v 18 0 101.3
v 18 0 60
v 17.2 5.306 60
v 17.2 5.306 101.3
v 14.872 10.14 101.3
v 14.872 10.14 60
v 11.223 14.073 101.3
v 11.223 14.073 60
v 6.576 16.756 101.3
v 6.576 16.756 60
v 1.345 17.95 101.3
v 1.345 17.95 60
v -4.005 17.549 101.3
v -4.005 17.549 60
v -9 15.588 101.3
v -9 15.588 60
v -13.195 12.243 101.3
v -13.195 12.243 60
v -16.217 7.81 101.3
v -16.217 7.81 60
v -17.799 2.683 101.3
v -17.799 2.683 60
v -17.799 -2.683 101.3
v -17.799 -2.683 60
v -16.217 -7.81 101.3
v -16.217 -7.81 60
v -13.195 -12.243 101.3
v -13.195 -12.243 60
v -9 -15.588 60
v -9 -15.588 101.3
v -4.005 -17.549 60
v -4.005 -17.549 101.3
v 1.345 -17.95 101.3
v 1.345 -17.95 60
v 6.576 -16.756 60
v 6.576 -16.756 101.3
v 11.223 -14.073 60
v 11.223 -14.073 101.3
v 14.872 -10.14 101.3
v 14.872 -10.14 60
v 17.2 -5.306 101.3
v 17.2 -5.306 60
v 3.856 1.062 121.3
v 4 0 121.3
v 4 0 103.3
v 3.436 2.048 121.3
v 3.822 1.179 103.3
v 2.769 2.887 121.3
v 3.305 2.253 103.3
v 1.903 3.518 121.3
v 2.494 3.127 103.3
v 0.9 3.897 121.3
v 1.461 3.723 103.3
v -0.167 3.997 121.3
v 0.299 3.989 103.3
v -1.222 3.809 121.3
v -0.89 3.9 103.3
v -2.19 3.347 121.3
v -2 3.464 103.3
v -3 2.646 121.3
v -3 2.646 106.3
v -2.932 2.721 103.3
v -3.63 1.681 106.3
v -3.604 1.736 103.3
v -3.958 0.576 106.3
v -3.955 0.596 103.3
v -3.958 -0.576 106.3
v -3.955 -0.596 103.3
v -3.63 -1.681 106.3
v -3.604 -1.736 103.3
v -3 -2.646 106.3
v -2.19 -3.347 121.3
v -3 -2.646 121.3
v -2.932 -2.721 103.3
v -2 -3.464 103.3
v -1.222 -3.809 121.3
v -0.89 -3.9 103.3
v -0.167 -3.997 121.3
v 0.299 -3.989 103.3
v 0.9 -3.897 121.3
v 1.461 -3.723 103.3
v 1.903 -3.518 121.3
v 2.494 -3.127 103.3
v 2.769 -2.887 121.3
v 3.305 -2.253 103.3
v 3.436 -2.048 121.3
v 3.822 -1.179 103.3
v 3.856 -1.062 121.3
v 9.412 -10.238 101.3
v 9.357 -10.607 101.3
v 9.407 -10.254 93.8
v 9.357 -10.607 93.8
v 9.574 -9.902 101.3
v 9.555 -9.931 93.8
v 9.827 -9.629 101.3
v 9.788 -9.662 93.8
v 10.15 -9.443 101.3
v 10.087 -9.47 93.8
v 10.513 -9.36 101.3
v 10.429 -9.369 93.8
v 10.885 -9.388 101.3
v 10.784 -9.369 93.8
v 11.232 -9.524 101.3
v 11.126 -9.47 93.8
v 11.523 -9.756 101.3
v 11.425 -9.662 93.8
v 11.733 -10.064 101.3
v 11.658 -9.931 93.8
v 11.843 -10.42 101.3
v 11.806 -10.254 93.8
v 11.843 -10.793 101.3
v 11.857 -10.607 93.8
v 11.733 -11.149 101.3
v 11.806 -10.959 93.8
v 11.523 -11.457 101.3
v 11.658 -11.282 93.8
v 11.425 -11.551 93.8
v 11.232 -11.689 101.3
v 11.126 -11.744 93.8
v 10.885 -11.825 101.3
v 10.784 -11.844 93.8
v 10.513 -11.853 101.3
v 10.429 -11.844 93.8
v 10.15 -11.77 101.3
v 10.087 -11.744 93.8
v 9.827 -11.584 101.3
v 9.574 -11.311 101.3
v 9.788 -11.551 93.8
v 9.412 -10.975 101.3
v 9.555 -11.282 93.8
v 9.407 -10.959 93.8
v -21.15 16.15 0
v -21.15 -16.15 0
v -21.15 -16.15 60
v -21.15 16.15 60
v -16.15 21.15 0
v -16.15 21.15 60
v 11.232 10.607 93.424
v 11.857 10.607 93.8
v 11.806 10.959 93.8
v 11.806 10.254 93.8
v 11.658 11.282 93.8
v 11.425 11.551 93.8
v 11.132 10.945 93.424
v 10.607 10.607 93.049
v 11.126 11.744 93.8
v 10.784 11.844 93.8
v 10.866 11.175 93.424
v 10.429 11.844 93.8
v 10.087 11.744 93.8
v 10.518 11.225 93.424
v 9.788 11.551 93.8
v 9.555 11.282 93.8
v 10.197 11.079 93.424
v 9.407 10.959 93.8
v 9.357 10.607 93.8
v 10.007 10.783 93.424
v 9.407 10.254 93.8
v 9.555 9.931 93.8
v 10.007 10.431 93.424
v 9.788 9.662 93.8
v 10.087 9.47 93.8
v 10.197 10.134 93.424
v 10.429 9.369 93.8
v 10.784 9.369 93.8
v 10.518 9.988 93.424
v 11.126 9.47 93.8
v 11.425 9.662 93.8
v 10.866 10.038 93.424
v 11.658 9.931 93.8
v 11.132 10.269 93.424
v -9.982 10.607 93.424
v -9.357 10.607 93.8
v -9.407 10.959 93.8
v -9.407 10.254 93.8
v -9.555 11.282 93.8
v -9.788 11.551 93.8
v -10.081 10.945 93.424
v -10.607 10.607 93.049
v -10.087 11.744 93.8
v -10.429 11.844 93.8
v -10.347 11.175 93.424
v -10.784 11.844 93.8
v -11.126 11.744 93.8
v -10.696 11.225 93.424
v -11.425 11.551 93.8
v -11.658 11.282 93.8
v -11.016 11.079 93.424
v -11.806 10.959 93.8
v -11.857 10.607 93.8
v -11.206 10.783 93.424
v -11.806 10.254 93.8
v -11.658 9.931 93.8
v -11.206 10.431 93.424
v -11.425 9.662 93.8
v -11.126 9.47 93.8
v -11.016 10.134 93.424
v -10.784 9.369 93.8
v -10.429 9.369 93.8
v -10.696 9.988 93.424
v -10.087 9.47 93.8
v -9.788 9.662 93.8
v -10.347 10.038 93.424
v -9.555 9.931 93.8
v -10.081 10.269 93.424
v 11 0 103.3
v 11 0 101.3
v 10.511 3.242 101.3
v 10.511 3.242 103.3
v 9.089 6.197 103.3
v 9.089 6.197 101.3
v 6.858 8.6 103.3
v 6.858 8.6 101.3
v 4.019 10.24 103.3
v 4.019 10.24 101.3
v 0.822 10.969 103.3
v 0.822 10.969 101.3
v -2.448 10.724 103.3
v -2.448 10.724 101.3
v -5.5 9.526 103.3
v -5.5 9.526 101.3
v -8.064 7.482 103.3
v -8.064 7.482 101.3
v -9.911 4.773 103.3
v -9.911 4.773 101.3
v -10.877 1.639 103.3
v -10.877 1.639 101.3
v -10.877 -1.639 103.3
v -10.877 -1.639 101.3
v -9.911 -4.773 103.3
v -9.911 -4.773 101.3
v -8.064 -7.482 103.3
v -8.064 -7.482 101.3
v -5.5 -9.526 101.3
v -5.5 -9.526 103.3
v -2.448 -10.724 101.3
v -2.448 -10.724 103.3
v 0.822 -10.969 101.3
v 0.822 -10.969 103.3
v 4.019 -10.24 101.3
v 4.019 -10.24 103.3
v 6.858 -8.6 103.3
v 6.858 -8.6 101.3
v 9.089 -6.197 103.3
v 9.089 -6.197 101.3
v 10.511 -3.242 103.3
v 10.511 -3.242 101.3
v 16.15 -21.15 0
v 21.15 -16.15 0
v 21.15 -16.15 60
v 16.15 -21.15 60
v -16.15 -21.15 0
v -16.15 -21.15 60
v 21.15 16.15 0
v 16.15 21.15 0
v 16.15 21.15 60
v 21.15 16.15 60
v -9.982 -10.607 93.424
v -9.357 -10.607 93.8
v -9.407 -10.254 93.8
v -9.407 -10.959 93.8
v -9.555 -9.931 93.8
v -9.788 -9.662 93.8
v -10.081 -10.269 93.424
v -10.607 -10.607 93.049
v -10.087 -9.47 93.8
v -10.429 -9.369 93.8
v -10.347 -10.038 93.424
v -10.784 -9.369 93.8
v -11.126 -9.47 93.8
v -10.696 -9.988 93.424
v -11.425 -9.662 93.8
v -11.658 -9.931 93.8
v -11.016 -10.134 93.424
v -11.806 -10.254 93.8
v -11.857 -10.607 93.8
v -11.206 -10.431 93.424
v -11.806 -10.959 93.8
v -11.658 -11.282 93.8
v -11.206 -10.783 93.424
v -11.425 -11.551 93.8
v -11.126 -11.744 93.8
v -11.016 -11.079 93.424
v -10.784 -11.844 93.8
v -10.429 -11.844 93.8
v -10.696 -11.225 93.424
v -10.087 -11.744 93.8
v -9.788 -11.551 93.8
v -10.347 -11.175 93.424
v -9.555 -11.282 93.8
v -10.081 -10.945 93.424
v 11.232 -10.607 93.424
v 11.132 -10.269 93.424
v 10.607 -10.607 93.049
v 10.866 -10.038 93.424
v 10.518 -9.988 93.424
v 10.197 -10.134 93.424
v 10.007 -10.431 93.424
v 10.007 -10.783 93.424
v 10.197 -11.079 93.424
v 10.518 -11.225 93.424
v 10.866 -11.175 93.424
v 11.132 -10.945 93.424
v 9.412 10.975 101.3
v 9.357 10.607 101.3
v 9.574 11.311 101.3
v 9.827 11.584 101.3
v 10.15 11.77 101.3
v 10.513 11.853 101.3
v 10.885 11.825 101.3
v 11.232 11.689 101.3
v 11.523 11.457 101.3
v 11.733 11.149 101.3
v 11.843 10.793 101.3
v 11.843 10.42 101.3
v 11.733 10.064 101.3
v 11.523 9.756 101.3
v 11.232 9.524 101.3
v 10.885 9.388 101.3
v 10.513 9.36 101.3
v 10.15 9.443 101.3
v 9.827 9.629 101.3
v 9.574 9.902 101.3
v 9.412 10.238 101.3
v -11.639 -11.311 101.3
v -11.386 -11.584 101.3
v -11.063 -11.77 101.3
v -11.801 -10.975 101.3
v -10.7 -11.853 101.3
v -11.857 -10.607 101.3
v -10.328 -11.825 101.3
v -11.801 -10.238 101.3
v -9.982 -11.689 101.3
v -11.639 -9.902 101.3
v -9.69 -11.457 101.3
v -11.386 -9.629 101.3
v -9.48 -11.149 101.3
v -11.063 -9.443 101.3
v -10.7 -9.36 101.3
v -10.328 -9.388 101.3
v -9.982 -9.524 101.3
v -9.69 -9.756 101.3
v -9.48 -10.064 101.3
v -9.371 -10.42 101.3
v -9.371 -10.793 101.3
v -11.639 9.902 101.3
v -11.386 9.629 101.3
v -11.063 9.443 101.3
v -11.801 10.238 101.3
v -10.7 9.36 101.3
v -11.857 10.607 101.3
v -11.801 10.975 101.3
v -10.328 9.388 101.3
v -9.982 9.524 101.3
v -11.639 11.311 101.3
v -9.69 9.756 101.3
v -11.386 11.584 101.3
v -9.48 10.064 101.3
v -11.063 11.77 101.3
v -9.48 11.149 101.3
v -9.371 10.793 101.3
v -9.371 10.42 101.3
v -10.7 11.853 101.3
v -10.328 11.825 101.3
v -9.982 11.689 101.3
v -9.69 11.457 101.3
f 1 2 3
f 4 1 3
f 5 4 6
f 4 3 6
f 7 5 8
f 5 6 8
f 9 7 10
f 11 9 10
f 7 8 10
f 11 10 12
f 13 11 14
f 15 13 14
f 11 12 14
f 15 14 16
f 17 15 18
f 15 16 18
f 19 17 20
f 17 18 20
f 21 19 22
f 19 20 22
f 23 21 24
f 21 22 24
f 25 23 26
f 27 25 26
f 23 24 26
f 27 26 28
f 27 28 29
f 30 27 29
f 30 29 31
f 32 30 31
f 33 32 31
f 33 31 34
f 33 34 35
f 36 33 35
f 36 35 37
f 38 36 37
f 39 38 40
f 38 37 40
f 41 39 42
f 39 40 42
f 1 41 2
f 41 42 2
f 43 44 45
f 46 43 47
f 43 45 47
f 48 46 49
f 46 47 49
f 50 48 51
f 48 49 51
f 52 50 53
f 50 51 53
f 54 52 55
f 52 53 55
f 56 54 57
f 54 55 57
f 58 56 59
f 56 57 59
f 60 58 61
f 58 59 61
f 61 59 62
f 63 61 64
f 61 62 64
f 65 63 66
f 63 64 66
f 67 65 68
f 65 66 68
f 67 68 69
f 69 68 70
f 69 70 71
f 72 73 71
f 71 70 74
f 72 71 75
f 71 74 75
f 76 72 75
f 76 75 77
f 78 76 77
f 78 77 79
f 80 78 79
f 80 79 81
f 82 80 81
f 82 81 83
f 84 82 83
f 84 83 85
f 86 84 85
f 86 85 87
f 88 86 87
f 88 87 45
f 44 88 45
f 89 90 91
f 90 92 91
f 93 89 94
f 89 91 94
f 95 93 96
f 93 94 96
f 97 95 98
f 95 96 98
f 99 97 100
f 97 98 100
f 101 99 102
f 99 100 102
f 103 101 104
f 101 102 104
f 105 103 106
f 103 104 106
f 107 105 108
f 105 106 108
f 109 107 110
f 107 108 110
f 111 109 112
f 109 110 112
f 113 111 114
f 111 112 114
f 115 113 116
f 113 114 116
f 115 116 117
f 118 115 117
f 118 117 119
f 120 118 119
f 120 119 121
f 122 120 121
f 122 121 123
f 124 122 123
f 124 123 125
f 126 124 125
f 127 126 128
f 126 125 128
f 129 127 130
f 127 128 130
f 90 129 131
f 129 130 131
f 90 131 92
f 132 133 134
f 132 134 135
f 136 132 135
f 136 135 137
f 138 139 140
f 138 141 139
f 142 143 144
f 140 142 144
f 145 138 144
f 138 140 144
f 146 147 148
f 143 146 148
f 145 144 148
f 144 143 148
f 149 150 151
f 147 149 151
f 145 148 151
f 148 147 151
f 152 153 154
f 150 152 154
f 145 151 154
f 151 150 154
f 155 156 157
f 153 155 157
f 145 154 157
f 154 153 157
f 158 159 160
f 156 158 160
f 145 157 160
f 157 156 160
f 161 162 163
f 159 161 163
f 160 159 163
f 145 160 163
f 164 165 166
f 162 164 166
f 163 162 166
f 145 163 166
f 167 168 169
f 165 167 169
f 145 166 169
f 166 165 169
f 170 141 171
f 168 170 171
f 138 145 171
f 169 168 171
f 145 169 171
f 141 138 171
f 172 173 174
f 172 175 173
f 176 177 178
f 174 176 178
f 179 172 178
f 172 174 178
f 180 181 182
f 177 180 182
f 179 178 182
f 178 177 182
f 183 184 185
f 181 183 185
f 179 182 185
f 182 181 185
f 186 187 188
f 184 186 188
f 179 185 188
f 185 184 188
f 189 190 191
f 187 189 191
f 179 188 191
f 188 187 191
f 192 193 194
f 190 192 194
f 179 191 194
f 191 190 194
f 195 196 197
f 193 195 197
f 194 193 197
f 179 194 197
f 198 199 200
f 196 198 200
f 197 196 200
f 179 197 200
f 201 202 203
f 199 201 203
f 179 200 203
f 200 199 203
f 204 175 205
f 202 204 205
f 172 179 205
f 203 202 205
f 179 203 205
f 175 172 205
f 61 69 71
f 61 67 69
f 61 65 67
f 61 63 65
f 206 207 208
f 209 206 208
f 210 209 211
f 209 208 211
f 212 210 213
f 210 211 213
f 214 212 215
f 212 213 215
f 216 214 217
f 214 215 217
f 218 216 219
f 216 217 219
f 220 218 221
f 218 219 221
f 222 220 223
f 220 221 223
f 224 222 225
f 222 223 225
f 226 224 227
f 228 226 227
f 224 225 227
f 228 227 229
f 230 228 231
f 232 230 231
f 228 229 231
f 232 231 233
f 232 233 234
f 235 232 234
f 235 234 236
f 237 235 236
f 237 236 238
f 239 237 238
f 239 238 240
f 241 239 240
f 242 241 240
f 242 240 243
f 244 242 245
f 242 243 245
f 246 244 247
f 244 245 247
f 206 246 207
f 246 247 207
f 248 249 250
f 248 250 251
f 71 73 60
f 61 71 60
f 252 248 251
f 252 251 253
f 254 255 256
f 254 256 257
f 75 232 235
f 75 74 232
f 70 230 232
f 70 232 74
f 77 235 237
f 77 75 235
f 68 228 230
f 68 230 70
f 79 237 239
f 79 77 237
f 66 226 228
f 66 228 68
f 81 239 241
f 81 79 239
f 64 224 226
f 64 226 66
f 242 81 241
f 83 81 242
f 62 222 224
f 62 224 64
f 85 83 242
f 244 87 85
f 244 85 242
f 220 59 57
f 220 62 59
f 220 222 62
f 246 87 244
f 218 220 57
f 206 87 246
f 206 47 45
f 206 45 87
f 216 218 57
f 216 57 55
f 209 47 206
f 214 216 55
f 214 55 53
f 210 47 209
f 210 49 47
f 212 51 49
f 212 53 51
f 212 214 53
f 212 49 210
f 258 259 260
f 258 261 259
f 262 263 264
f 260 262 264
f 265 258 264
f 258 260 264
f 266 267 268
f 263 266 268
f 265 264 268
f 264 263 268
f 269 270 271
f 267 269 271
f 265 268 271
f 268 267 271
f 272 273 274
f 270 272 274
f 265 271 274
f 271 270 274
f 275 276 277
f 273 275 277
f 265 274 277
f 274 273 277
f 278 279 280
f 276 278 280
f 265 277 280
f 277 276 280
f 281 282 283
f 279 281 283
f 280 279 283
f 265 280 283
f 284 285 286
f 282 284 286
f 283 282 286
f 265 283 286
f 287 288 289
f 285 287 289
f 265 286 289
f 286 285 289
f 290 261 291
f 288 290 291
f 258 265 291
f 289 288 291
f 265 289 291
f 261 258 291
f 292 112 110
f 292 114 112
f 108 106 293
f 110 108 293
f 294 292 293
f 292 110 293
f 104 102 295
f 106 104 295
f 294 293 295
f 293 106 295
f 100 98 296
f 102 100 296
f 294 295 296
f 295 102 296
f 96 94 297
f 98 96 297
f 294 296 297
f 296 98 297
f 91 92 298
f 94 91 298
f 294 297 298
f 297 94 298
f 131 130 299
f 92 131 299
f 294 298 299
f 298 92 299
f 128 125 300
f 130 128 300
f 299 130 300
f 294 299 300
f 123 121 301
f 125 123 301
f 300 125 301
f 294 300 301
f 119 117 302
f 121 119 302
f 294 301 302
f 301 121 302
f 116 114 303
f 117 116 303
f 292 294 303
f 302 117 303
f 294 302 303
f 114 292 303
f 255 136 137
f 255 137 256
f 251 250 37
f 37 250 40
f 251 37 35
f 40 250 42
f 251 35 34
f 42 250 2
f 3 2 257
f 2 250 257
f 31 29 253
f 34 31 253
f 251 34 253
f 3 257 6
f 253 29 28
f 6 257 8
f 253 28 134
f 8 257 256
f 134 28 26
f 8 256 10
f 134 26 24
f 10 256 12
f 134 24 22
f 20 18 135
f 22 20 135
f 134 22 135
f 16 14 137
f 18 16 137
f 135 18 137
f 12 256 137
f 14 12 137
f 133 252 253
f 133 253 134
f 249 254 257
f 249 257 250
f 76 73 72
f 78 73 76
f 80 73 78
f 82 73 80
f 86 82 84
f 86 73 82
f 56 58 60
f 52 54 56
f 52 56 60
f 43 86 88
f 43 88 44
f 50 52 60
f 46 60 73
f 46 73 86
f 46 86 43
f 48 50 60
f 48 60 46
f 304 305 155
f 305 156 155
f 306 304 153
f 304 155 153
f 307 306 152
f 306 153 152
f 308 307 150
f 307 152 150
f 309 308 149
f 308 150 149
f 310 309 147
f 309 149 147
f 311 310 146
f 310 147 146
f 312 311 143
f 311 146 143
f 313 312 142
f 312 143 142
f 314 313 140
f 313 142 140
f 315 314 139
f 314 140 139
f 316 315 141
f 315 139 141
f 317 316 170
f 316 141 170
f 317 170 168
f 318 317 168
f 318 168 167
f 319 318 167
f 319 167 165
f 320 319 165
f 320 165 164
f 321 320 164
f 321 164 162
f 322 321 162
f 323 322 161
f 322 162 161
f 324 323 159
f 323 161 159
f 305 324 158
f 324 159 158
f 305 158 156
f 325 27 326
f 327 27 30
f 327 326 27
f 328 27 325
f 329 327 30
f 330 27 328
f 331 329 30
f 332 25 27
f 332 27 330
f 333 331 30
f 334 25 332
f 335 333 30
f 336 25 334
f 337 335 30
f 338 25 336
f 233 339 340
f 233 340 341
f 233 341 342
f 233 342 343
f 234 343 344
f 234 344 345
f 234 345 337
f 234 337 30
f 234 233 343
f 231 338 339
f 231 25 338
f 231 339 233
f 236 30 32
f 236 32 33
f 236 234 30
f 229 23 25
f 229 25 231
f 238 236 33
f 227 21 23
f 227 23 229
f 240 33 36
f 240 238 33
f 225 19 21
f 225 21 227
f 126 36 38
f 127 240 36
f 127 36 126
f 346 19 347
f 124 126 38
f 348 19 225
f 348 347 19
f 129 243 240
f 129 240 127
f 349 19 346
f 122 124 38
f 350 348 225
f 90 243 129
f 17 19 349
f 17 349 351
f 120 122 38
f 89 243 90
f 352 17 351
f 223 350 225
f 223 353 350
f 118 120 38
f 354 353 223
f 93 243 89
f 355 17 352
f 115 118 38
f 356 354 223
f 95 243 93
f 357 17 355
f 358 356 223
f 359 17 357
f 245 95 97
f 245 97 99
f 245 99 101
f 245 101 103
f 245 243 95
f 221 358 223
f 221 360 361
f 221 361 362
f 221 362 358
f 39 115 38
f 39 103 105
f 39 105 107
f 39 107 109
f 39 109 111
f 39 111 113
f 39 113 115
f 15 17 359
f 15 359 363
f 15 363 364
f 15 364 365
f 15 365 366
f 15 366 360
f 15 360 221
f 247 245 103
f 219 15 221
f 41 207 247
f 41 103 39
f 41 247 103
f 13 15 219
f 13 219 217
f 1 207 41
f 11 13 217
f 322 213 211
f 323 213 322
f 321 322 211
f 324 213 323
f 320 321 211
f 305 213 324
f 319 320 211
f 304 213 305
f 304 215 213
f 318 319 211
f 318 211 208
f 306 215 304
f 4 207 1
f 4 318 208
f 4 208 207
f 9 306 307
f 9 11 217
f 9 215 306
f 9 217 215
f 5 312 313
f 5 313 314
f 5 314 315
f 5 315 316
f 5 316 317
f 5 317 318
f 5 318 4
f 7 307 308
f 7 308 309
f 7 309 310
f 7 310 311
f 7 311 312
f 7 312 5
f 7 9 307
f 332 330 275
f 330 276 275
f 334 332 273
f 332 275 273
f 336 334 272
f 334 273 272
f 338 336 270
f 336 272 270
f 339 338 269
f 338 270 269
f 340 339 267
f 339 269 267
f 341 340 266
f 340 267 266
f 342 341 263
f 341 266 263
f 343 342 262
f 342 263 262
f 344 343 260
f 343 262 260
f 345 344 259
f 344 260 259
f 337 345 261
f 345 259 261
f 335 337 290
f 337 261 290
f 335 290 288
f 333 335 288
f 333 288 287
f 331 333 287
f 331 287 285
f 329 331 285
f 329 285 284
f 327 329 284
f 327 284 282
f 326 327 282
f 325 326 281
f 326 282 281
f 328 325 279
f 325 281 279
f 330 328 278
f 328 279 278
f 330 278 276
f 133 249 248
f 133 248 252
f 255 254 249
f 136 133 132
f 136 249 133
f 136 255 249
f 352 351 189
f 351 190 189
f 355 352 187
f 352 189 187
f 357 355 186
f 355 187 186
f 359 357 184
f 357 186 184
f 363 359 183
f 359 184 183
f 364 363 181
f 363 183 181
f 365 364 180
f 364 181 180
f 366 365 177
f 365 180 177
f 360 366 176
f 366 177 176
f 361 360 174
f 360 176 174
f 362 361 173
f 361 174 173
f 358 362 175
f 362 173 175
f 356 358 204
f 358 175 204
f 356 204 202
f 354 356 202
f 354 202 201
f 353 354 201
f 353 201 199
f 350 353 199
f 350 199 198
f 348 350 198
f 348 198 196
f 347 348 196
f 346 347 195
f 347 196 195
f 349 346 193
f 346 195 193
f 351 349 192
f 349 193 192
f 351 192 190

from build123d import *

# Parameters (mm, degrees)
EXTRUDE_1_DEPTH        = 60
SKETCH_2_R             = 18
EXTRUDE_2_DEPTH        = 41.3
SKETCH_3_R             = 11
EXTRUDE_3_DEPTH        = 2
SKETCH_4_R             = 4
EXTRUDE_4_DEPTH        = 18
SKETCH_5_W             = 8.09428643
SKETCH_5_H             = 13.450799509
CUT_EXTRUDE_1_DEPTH    = 15
SKETCH_6_R             = 1
CUT_EXTRUDE_2_DEPTH    = 5
HOLE_WIZARD_M3_1_D     = 2.5
HOLE_WIZARD_M3_1_DEPTH = 7.5
HOLE_WIZARD_M3_1_TIP   = 0.751075774


with BuildPart() as part:
    # 草图1 → 凸台-拉伸1 (new body)
    with BuildSketch(Plane.XY):
        Polygon((-21.15, 16.15), (-16.15, 21.15), (16.15, 21.15), (21.15, 16.15), (21.15, -16.15), (16.15, -21.15), (-16.15, -21.15), (-21.15, -16.15), align=None)
    extrude(amount=EXTRUDE_1_DEPTH)

    # 草图2 → 凸台-拉伸2 (add)
    with BuildSketch(Plane.XY.offset(60)):
        Circle(SKETCH_2_R)
    extrude(amount=EXTRUDE_2_DEPTH)

    # 草图3 → 凸台-拉伸3 (add)
    with BuildSketch(Plane.XY.offset(101.3)):
        Circle(SKETCH_3_R)
    extrude(amount=EXTRUDE_3_DEPTH)

    # 草图4 → 凸台-拉伸4 (add)
    with BuildSketch(Plane.XY.offset(103.3)):
        Circle(SKETCH_4_R)
    extrude(amount=EXTRUDE_4_DEPTH)

    # 草图5 → 切除-拉伸1 (cut)
    with BuildSketch(Plane.XY.offset(121.3)):
        with Locations((-7.047143215, -1.347451383)):
            Rectangle(SKETCH_5_W, SKETCH_5_H)
    extrude(amount=-CUT_EXTRUDE_1_DEPTH, mode=Mode.SUBTRACT)

    # 草图6 → 切除-拉伸2 (cut)
    with BuildSketch(Plane.XY.offset(101.3)):
        with Locations((-10.606601718, 10.606601718)):
            Circle(SKETCH_6_R)
        with Locations((10.606601718, 10.606601718)):
            Circle(SKETCH_6_R)
        with Locations((-10.606601718, -10.606601718)):
            Circle(SKETCH_6_R)
        with Locations((10.606601718, -10.606601718)):
            Circle(SKETCH_6_R)
    extrude(amount=-CUT_EXTRUDE_2_DEPTH, mode=Mode.SUBTRACT)

    # M3 螺纹孔1
    with Locations(Plane.XY.offset(101.3)):
        with Locations((-10.606601718, 10.606601718), (10.606601718, 10.606601718), (-10.606601718, -10.606601718), (10.606601718, -10.606601718)):
            Hole(HOLE_WIZARD_M3_1_D / 2, depth=HOLE_WIZARD_M3_1_DEPTH)
            with Locations((0, 0, -(HOLE_WIZARD_M3_1_DEPTH + HOLE_WIZARD_M3_1_TIP / 2))):  # 118° drill point
                Cone(0, HOLE_WIZARD_M3_1_D / 2, HOLE_WIZARD_M3_1_TIP, mode=Mode.SUBTRACT)


solid = part.part
